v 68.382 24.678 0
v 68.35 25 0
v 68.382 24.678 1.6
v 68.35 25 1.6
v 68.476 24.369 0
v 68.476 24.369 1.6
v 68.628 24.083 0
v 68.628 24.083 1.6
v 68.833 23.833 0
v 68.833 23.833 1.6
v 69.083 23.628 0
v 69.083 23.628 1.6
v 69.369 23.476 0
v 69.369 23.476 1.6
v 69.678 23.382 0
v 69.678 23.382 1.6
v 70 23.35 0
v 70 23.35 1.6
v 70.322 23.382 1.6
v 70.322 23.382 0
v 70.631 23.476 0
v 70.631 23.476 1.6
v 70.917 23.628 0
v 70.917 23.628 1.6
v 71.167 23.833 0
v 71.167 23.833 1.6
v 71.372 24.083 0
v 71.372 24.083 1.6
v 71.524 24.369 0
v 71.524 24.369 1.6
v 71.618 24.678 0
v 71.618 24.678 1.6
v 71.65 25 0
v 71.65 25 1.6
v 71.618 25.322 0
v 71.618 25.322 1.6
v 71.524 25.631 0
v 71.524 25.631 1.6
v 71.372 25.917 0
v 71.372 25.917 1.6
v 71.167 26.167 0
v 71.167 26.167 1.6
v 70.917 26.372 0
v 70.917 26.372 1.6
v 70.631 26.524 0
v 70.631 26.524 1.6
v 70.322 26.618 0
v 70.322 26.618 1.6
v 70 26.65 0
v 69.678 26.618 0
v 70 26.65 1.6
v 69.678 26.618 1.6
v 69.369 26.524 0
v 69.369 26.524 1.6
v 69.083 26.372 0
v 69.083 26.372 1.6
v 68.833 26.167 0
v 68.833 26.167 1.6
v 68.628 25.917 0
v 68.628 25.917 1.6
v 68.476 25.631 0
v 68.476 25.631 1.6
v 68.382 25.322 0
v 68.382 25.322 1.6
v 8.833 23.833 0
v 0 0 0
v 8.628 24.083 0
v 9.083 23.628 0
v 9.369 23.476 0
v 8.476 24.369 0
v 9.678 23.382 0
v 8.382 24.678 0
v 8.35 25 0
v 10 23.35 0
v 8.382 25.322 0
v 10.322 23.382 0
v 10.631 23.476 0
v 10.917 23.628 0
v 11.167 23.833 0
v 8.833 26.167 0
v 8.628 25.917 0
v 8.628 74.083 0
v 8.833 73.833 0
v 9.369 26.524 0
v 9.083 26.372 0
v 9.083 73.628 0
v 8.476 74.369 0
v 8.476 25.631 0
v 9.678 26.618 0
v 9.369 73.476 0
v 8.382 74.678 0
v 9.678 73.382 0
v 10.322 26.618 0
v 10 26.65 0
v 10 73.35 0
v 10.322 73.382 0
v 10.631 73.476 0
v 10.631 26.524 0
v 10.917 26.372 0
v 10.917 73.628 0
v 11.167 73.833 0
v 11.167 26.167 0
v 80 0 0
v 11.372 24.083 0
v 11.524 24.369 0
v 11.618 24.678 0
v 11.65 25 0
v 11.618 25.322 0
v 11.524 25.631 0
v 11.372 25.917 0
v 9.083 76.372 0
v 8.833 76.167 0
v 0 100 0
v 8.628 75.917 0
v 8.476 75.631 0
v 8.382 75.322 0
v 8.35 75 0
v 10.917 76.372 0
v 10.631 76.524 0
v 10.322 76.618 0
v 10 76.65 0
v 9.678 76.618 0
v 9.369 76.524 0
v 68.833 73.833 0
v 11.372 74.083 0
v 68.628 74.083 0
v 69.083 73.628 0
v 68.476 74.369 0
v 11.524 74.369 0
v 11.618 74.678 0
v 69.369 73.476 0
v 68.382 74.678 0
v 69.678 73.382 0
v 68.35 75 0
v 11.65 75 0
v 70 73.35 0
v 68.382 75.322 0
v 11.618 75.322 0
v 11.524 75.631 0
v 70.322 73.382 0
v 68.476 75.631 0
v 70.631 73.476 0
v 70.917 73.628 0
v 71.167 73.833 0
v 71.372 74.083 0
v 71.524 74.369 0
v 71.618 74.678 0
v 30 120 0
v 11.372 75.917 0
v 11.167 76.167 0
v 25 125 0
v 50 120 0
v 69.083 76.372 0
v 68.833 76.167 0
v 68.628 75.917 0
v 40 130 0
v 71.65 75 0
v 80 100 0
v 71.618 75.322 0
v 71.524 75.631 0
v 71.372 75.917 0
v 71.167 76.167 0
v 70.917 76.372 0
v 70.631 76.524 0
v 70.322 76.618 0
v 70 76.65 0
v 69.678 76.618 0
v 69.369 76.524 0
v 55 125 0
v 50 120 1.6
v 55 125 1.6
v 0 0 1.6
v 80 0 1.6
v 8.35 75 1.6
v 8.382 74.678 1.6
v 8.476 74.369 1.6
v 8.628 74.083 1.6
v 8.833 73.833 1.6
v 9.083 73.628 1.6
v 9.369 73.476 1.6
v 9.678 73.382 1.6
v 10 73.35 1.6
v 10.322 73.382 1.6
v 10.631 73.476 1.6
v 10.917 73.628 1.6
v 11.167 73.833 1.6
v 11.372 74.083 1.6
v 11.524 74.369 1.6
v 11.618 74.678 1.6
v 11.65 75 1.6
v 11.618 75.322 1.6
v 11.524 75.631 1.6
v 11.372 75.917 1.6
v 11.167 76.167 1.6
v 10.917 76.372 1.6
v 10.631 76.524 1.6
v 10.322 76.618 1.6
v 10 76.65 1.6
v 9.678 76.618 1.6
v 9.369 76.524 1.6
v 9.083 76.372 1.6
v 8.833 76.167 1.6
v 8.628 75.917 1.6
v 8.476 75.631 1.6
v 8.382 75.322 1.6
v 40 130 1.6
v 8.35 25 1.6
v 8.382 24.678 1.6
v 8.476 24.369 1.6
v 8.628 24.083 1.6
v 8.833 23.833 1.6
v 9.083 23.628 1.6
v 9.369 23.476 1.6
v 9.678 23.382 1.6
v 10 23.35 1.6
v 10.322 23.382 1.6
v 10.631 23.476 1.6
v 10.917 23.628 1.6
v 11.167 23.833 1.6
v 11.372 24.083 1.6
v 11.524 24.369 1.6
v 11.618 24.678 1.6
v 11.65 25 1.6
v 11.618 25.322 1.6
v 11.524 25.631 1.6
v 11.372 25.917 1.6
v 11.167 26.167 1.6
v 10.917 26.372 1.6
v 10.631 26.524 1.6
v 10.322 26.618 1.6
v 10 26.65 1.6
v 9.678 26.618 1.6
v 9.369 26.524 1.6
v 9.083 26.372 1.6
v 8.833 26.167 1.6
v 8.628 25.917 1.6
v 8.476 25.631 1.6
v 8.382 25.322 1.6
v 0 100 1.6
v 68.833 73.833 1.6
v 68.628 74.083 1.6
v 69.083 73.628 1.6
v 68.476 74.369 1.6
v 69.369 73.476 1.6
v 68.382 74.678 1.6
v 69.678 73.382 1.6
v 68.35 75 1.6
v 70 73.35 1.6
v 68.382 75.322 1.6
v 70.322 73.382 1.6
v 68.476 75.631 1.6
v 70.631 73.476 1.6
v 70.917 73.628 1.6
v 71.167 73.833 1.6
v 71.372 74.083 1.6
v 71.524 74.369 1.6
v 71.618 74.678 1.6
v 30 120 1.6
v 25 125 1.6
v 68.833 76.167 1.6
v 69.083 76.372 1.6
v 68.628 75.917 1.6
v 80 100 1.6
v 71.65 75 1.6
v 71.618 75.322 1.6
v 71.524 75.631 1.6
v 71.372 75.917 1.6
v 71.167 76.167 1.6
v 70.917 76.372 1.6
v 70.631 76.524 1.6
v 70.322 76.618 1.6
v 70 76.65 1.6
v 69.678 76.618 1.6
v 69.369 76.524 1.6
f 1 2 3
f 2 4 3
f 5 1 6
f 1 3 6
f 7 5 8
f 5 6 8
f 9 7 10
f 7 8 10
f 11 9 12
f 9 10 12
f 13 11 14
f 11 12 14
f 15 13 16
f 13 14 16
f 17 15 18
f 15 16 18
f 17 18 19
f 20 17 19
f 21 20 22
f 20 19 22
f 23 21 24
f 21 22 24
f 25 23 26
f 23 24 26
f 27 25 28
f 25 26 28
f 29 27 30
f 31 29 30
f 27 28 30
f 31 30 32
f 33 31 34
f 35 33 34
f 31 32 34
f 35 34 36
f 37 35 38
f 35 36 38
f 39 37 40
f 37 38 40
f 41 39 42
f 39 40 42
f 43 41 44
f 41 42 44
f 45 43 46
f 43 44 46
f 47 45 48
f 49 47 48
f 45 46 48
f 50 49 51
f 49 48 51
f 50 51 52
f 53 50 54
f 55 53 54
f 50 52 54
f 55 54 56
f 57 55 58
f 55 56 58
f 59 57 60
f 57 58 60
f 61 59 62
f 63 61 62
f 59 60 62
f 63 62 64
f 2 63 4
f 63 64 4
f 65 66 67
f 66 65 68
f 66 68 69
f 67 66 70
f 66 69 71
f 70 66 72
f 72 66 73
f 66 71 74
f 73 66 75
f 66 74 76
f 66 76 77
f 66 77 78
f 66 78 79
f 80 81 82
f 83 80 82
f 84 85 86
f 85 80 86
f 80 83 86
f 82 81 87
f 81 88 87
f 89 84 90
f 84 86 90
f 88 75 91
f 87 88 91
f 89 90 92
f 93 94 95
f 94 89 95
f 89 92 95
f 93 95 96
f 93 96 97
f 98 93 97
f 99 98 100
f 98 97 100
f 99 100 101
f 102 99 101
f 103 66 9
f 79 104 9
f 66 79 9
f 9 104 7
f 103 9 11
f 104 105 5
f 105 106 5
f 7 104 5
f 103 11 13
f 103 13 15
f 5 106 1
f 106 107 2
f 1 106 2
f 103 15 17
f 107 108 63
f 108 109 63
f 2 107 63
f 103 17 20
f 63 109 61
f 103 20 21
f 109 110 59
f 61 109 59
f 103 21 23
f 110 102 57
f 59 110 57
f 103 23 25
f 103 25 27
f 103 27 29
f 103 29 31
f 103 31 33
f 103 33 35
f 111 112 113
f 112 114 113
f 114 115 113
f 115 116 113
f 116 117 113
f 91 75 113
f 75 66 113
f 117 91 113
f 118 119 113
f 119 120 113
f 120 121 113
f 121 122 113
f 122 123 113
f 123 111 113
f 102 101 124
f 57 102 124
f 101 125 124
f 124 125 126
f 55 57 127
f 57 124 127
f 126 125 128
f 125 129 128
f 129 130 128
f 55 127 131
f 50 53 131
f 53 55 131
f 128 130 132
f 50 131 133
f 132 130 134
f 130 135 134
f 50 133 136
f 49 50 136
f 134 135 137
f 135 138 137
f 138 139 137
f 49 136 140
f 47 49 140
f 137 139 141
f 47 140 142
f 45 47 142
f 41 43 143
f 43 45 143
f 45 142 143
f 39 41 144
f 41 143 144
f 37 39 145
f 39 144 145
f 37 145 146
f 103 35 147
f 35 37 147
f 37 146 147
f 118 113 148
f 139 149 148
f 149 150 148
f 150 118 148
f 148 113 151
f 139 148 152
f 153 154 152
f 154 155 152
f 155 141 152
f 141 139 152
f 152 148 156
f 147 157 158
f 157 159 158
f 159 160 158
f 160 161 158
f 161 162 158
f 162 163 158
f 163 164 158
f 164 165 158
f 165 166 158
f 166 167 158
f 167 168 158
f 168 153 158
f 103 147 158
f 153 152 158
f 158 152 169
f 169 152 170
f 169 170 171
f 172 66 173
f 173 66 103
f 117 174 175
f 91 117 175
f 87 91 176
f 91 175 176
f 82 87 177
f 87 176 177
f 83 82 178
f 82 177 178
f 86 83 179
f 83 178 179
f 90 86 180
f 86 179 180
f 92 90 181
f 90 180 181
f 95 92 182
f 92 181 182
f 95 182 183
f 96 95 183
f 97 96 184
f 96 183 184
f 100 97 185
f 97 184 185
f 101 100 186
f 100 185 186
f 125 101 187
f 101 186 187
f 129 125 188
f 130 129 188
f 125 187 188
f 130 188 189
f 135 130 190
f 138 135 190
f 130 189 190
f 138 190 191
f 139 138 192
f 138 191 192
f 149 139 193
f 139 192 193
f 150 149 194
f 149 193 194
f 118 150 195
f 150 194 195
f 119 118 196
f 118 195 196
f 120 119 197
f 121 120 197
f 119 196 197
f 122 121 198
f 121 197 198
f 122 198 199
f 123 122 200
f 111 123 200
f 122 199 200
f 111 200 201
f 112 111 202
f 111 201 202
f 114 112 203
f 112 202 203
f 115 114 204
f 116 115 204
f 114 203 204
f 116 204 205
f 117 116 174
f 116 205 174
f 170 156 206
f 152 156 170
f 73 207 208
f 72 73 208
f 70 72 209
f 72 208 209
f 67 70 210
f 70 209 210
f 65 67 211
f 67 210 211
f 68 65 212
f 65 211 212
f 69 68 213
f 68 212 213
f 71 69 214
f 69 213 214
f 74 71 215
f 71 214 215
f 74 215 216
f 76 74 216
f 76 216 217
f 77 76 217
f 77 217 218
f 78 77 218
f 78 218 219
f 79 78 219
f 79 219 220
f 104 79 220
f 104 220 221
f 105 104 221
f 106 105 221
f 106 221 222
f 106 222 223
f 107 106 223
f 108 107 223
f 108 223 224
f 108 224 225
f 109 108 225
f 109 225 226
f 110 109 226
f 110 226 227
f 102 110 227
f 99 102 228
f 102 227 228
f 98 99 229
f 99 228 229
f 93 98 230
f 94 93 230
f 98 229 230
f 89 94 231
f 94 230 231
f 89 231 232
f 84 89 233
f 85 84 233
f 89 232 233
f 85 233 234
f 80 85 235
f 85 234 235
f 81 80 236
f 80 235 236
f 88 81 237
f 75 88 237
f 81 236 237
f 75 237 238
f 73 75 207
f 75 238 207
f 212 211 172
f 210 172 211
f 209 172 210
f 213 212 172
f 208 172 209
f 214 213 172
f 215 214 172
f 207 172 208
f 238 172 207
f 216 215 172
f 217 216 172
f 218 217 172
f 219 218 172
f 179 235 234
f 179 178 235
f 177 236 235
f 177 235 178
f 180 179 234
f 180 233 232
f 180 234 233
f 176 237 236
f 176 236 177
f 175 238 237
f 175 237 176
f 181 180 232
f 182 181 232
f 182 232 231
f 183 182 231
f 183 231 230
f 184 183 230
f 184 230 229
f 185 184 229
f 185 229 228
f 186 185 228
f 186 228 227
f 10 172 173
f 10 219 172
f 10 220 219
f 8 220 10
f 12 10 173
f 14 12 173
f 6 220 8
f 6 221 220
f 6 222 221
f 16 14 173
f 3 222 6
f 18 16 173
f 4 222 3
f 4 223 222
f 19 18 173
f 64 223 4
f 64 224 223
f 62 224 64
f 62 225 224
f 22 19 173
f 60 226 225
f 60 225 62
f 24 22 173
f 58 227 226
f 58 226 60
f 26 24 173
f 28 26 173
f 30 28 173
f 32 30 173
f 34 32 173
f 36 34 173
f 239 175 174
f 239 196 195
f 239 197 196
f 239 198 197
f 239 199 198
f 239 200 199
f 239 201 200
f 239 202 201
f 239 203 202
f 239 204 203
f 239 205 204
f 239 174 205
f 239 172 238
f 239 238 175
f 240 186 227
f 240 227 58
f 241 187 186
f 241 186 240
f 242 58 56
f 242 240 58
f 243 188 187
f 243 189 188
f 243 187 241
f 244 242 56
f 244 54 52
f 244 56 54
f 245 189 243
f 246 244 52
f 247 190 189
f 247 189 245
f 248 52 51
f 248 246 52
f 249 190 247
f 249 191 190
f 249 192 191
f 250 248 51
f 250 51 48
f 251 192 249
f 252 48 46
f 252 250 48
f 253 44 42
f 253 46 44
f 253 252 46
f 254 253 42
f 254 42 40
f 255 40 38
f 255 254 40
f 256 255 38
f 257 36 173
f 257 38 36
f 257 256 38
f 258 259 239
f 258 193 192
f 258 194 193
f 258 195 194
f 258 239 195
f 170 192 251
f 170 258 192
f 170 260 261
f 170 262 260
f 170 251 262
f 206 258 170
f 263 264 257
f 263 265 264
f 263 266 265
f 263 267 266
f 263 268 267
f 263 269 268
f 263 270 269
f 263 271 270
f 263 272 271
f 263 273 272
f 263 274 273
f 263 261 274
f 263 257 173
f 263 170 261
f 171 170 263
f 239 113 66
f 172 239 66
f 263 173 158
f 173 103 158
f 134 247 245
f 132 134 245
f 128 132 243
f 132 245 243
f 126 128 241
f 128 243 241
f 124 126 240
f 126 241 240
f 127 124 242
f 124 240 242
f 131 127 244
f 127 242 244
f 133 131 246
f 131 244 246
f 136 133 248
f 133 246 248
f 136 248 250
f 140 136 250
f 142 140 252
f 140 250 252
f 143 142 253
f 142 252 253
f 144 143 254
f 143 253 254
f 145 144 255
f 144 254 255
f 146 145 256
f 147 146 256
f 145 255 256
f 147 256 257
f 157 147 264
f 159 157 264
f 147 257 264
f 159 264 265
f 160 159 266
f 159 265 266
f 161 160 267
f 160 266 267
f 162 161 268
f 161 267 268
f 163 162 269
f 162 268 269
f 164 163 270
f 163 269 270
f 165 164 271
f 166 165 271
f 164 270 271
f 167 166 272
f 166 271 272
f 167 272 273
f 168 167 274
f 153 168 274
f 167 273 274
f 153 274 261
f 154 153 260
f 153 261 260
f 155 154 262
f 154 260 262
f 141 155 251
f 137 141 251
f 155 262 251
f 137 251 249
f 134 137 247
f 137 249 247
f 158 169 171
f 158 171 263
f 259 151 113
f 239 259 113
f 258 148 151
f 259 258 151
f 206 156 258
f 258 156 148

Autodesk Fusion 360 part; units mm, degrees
sketch "Sketch1" plane through (0, 0, 0) normal (0, 0, 1) x (1, 0, 0)
  line L0 (0, 0) -> (80, 0)
  line L1 (80, 0) -> (80, 100)
  line L2 (80, 100) -> (0, 100)
  line L3 (0, 100) -> (0, 0)
  line L4 (40, 100) -> (40, 130)
  line L5 (40, 130) -> (50, 120)
  line L6 (50, 120) -> (55, 125)
  line L7 (55, 125) -> (65, 115)
  line L8 (65, 115) -> (80, 100)
  line L9 (40, 130) -> (30, 120)
  line L10 (30, 120) -> (25, 125)
  line L11 (25, 125) -> (0, 100)
extrude "Extrude1" add sketch "Sketch1" along normal blind 6
extrude "Extrude2" cut 1 faces at (26.6667, 66.6667, 6) along direction (0, 0, -1) blind 4.4
sketch "Sketch2" plane through (0, 0, 1.6) normal (0, 0, 1) x (-1, 0, 0)
  line L0 (-40, -130) -> (-30, -120)
  line L1 (-30, -120) -> (-25, -125)
  line L2 (-25, -125) -> (0, -100)
  line L3 (0, -100) -> (0, 0)
  line L4 (0, 0) -> (-80, 0)
  line L5 (-80, 0) -> (-80, -100)
  line L6 (-80, -100) -> (-55, -125)
  line L7 (-55, -125) -> (-50, -120)
  line L8 (-50, -120) -> (-40, -130)
  line L9 (-80, -100) -> (0, 0) construction
  line L10 (0, -100) -> (-80, 0) construction
  line L11 (-70, -75) -> (-10, -75) construction
  line L12 (-10, -75) -> (-10, -25) construction
  line L13 (-10, -25) -> (-70, -25) construction
  line L14 (-70, -25) -> (-70, -75) construction
  line L15 (-70, -75) -> (-10, -25) construction
  line L16 (-10, -75) -> (-70, -25) construction
  circle A0 centre (-10, -75) radius 1.65
  circle A1 centre (-70, -75) radius 1.65
  circle A2 centre (-10, -25) radius 1.65
  circle A3 centre (-70, -25) radius 1.65
  point P0 (-40, -50)
  dimension "d5" = 60
  dimension "d6" = 50
  dimension "d7" = 3.3
  dimension "d8" = 3.3
  dimension "d9" = 3.3
  dimension "d10" = 3.3
extrude "Extrude3" cut sketch "Sketch2" against normal blind 55 contours A0 | A1 | A2 | A3
sketch "Sketch3" plane through (0, 0, 1.6) normal (0, 0, 1) x (-1, 0, 0)
  circle A0 centre (-10, -25) radius 1.65
  circle A1 centre (-10, -75) radius 1.65
  circle A2 centre (-70, -25) radius 1.65
  circle A3 centre (-70, -75) radius 1.65
  line L0 (-40, -130) -> (-30, -120)
  line L1 (-30, -120) -> (-25, -125)
  line L2 (-25, -125) -> (0, -100)
  line L3 (0, -100) -> (0, 0)
  line L4 (0, 0) -> (-80, 0)
  line L5 (-80, 0) -> (-80, -100)
  line L6 (-80, -100) -> (-55, -125)
  line L7 (-55, -125) -> (-50, -120)
  line L8 (-50, -120) -> (-40, -130)
sketch "Sketch4" plane through (0, 0, 1.6) normal (0, 0, 1) x (1, 0, 0)
